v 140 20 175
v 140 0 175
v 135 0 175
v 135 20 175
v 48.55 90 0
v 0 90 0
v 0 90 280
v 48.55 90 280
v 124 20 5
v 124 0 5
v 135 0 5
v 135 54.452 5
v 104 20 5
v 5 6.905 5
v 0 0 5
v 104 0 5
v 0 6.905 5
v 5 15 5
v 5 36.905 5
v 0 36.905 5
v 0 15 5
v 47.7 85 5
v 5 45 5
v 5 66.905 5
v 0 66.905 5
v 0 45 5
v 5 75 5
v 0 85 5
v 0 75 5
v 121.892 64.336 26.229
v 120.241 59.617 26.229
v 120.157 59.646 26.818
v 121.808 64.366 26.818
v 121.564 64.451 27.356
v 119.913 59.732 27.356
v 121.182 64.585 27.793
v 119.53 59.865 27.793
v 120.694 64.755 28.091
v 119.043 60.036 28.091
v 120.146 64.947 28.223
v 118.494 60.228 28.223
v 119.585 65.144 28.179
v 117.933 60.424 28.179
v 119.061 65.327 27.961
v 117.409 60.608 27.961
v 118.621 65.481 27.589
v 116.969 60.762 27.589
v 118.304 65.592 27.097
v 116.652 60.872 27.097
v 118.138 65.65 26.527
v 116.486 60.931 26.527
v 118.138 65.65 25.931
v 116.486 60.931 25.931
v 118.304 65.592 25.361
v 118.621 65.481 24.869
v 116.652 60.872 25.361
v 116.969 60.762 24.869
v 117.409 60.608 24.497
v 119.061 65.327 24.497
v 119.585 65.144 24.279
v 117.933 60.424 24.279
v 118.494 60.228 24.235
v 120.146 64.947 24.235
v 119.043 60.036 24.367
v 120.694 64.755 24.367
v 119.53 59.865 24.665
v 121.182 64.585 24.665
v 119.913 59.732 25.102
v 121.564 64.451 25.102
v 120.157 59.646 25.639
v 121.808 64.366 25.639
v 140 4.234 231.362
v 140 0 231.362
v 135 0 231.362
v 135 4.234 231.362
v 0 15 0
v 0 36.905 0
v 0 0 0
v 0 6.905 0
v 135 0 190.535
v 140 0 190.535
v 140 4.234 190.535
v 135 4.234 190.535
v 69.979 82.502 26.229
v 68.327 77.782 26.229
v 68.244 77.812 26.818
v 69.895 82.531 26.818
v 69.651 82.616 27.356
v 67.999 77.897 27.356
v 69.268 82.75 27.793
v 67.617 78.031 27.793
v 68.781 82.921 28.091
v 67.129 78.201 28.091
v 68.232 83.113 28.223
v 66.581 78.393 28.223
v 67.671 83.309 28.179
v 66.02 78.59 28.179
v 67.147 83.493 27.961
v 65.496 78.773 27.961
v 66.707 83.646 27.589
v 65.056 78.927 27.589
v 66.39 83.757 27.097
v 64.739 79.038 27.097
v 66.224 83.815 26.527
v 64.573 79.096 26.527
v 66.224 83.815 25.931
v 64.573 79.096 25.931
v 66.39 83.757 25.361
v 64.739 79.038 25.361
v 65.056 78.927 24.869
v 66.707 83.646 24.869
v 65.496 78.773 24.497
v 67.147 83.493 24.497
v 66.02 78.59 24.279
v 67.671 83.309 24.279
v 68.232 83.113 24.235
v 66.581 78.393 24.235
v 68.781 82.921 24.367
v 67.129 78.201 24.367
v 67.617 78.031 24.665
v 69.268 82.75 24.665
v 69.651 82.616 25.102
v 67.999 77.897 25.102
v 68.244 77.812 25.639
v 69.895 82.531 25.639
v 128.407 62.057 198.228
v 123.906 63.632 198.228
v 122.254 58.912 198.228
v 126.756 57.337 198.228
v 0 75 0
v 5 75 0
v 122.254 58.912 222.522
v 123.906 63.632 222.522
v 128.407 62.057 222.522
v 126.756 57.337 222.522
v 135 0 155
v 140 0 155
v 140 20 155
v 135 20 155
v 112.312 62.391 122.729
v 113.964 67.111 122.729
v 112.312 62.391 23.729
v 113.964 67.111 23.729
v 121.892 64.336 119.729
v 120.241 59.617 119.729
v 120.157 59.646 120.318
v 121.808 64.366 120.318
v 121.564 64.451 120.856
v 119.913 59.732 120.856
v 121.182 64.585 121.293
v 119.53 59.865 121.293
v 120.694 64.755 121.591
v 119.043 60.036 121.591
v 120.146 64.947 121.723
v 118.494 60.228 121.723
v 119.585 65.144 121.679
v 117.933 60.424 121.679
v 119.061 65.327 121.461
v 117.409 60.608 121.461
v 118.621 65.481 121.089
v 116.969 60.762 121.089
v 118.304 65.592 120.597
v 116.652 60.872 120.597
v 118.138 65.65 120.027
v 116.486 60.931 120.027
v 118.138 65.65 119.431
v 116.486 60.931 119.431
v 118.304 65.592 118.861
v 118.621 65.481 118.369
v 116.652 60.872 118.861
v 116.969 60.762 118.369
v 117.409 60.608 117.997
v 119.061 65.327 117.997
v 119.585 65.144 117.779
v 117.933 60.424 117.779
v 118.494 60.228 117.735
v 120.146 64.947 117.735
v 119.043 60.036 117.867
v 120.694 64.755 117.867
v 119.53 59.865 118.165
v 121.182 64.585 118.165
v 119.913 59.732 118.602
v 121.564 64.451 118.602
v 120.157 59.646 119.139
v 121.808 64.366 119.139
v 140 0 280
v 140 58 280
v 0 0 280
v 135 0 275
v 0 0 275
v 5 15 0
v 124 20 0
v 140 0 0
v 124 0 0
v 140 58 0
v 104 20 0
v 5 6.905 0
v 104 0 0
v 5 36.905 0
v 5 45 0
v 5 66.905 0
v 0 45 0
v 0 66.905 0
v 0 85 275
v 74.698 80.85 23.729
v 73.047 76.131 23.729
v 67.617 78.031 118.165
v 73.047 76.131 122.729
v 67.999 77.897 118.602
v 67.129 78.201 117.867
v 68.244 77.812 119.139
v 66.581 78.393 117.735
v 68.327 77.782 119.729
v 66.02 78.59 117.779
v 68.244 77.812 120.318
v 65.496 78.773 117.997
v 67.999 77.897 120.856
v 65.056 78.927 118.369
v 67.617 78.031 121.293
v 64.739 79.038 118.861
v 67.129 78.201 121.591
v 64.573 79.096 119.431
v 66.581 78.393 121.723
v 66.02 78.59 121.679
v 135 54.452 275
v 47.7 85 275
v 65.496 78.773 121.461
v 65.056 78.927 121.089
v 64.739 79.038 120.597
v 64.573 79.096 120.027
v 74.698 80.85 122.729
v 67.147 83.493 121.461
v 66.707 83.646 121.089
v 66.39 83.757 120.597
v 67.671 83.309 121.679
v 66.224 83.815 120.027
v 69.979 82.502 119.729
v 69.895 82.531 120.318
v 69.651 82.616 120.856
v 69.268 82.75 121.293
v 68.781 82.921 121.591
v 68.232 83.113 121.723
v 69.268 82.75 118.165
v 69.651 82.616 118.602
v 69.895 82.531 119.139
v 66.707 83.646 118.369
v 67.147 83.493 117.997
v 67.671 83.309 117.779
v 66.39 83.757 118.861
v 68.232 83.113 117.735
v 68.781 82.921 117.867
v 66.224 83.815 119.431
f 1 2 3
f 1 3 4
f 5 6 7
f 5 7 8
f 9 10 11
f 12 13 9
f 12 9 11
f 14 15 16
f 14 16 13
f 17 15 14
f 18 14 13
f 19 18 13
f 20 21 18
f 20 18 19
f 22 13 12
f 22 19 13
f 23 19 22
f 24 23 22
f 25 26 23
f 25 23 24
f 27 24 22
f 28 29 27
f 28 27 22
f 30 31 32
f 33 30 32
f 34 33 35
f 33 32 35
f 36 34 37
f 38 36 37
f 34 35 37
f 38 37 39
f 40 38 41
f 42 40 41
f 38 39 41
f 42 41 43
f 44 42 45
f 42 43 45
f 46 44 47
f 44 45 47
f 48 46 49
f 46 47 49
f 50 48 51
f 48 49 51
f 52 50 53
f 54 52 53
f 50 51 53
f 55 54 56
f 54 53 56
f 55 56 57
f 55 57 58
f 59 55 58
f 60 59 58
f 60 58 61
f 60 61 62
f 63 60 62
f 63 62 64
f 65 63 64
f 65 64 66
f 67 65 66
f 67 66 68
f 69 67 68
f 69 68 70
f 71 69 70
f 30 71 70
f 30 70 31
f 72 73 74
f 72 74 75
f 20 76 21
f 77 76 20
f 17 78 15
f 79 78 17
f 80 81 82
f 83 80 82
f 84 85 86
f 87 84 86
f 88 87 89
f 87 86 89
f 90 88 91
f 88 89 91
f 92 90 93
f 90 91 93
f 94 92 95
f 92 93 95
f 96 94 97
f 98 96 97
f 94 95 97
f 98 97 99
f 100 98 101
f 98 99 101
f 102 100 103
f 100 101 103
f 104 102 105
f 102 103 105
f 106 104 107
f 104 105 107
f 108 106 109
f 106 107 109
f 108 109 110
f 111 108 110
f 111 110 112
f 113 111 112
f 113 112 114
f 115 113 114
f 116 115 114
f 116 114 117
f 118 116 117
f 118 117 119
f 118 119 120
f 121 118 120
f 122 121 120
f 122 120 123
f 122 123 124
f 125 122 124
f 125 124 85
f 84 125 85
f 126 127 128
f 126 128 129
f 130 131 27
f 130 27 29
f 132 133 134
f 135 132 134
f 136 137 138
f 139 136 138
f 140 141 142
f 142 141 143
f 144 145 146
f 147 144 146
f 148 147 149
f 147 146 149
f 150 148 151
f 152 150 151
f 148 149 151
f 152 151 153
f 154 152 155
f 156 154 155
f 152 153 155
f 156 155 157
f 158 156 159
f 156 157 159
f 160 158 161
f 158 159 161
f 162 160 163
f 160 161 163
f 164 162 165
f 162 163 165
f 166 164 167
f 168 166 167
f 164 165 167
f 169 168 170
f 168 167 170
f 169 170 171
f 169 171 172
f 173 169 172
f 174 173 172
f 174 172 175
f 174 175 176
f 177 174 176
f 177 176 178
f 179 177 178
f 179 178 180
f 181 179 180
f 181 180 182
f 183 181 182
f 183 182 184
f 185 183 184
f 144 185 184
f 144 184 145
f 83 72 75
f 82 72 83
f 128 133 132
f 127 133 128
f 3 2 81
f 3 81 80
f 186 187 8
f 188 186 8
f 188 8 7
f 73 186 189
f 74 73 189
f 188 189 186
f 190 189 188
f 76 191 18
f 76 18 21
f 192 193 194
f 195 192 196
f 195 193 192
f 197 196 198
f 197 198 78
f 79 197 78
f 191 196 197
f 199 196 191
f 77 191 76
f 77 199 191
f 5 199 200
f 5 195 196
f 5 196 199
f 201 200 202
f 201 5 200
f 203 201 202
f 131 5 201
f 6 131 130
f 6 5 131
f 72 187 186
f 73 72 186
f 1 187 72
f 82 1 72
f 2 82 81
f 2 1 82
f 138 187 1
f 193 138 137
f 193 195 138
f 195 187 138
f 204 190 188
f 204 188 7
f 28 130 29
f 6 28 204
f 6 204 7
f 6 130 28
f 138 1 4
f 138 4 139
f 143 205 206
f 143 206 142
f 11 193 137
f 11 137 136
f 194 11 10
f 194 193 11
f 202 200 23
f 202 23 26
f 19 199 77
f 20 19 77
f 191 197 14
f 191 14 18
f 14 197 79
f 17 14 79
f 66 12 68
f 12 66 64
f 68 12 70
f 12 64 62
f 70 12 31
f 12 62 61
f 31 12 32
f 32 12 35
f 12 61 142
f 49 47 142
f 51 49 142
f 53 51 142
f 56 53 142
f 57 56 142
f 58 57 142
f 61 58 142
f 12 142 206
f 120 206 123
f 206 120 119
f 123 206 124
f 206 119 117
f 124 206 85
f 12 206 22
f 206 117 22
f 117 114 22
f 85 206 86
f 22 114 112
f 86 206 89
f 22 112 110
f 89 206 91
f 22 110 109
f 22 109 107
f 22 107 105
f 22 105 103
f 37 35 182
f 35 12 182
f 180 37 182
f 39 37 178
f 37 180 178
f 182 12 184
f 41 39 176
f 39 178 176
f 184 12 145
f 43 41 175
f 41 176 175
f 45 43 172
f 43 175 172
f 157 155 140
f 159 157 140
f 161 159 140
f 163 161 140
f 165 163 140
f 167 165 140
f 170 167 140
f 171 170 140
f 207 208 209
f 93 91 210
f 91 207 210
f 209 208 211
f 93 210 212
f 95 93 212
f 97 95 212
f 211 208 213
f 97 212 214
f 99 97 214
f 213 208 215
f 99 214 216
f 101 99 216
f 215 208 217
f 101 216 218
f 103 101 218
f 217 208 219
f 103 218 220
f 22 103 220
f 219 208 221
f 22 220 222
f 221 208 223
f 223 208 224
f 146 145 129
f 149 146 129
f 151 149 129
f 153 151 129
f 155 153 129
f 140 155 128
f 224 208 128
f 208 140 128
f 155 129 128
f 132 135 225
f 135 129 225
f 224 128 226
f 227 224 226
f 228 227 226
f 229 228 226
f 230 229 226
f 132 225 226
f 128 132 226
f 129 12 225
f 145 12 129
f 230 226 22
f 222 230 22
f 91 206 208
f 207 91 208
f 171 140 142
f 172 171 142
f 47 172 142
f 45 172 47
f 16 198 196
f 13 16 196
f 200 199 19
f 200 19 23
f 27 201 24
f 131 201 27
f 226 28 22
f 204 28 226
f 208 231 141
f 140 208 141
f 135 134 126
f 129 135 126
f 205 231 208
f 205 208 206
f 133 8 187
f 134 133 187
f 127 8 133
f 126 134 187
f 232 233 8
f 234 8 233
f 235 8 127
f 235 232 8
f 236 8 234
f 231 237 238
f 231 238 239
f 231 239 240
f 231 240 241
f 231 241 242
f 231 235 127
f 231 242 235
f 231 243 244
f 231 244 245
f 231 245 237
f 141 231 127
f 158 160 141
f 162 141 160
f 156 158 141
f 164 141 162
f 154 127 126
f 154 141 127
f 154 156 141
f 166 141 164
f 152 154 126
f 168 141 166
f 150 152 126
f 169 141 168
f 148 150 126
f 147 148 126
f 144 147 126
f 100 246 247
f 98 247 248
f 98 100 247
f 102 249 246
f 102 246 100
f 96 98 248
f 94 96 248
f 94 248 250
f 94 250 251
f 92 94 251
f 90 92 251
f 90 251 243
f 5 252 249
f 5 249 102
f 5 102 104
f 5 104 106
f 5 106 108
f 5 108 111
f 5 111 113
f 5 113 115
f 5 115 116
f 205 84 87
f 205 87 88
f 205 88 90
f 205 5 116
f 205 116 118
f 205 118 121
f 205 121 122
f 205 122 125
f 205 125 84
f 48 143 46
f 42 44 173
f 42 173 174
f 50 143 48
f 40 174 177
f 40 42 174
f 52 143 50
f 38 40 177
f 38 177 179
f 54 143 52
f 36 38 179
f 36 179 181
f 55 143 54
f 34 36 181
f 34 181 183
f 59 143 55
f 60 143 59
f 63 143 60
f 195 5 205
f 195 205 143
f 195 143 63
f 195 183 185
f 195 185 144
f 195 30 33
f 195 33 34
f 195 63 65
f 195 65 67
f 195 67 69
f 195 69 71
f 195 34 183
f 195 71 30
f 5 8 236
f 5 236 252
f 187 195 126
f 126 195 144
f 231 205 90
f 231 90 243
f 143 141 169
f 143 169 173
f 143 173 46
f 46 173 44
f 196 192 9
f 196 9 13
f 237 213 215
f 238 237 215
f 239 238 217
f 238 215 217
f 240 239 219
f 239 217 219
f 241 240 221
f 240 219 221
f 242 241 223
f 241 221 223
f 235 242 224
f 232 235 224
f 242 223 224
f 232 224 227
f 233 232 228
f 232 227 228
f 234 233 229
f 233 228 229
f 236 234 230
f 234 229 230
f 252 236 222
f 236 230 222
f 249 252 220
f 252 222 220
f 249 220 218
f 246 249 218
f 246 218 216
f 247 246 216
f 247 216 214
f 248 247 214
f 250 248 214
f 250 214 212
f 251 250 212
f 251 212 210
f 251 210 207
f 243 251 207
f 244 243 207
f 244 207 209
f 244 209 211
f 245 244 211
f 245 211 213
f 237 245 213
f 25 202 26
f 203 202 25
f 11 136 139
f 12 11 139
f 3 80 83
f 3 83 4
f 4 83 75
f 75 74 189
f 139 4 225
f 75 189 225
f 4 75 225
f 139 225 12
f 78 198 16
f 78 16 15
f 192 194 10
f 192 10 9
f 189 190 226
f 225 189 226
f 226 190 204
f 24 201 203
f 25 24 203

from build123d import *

# Parameters (mm, degrees)
BOSS_EXTRUDE1_DEPTH = 280
CUT_EXTRUDE1_DEPTH  = 270
SKETCH3_W           = 270
SKETCH3_H           = 85
CUT_EXTRUDE2_DEPTH  = 10
SKETCH5_W           = 20
SKETCH5_H           = 20
CUT_EXTRUDE3_DEPTH  = 10
SKETCH6_W           = 20
SKETCH6_H           = 40
CUT_EXTRUDE4_DEPTH  = 10
SKETCH7_W           = 40.827285369
SKETCH7_H           = 8.467009586
CUT_EXTRUDE5_DEPTH  = 10
SKETCH8_W           = 10
SKETCH8_H           = 8.095282404
CUT_EXTRUDE6_DEPTH  = 10
SKETCH9_W           = 41.6
SKETCH9_H           = 99
CUT_EXTRUDE7_DEPTH  = 10
SKETCH10_R          = 2
CUT_EXTRUDE8_DEPTH  = 10
SKETCH11_W          = 4.769310571
SKETCH11_H          = 24.293595375
CUT_EXTRUDE9_DEPTH  = 10


with BuildPart() as part:
    # Sketch1 → Boss-Extrude1 (new body)
    with BuildSketch(Plane.XY):
        Polygon((0, 0), (0, 90), (48.55, 90), (140, 58), (140, 0), align=None)
    extrude(amount=BOSS_EXTRUDE1_DEPTH)

    # Sketch2 → Cut-Extrude1 (cut)
    with BuildSketch(Plane.XY.offset(275)):
        Polygon((47.700459291, 85), (5, 85), (5, 0), (135, 0), (135, 54.452320364), align=None)
    extrude(amount=-CUT_EXTRUDE1_DEPTH, mode=Mode.SUBTRACT)

    # Sketch3 → Cut-Extrude2 (cut)
    with BuildSketch(Plane.ZY):
        with Locations((140, 42.5)):
            Rectangle(SKETCH3_W, SKETCH3_H)
    extrude(amount=-CUT_EXTRUDE2_DEPTH, mode=Mode.SUBTRACT)

    # Sketch5 → Cut-Extrude3 (cut)
    with BuildSketch(Plane(origin=(0, 0, 0), x_dir=(-1, 0, 0), z_dir=(0, 0, -1))):
        with Locations((-114, 10)):
            Rectangle(SKETCH5_W, SKETCH5_H)
    extrude(amount=-CUT_EXTRUDE3_DEPTH, mode=Mode.SUBTRACT)

    # Sketch6 → Cut-Extrude4 (cut)
    with BuildSketch(Plane(origin=(140, 0, 0), x_dir=(0, 0, -1), z_dir=(1, 0, 0))):
        with Locations((-165, 0)):
            Rectangle(SKETCH6_W, SKETCH6_H)
    extrude(amount=-CUT_EXTRUDE4_DEPTH, mode=Mode.SUBTRACT)

    # Sketch7 → Cut-Extrude5 (cut)
    with BuildSketch(Plane(origin=(140, 0, 0), x_dir=(0, 0, -1), z_dir=(1, 0, 0))):
        with Locations((-210.948744131, 0)):
            Rectangle(SKETCH7_W, SKETCH7_H)
    extrude(amount=-CUT_EXTRUDE5_DEPTH, mode=Mode.SUBTRACT)

    # Sketch8 → Cut-Extrude6 (cut)
    with BuildSketch(Plane(origin=(0, 0, 0), x_dir=(-1, 0, 0), z_dir=(0, 0, -1))):
        with Locations((0, 70.952358798)):
            Rectangle(SKETCH8_W, SKETCH8_H)
        with Locations((0, 40.952358798)):
            Rectangle(SKETCH8_W, SKETCH8_H)
        with Locations((0, 10.952358798)):
            Rectangle(SKETCH8_W, SKETCH8_H)
    extrude(amount=-CUT_EXTRUDE6_DEPTH, mode=Mode.SUBTRACT)

    # Sketch9 → Cut-Extrude7 (cut)
    with BuildSketch(Plane(origin=(33.353337731, 95.317585485, 0), x_dir=(0.9438824905069991, -0.3302814619598029, 0), z_dir=(0.3302814619598029, 0.9438824905069991, 0))):
        with Locations((64.602992172, -73.228951903)):
            Rectangle(SKETCH9_W, SKETCH9_H)
    extrude(amount=-CUT_EXTRUDE7_DEPTH, mode=Mode.SUBTRACT)

    # Sketch10 → Cut-Extrude8 (cut)
    with BuildSketch(Plane(origin=(31.701930421, 90.598173032, 0), x_dir=(0.9438824905069991, -0.330281461959803, 0), z_dir=(-0.330281461959803, -0.9438824905069991, 0))):
        with Locations((91.802992172, 26.228951903)):
            Circle(SKETCH10_R)
        with Locations((36.802992172, 26.228951903)):
            Circle(SKETCH10_R)
        with Locations((91.802992172, 119.728951903)):
            Circle(SKETCH10_R)
        with Locations((36.802992172, 119.728951903)):
            Circle(SKETCH10_R)
    extrude(amount=-CUT_EXTRUDE8_DEPTH, mode=Mode.SUBTRACT)

    # Sketch11 → Cut-Extrude9 (cut)
    with BuildSketch(Plane(origin=(33.353337731, 95.317585485, 0), x_dir=(0.9438824905069991, -0.3302814619598029, 0), z_dir=(0.3302814619598029, 0.9438824905069991, 0))):
        with Locations((98.320616835, -210.37484194)):
            Rectangle(SKETCH11_W, SKETCH11_H)
    extrude(amount=-CUT_EXTRUDE9_DEPTH, mode=Mode.SUBTRACT)


solid = part.part
